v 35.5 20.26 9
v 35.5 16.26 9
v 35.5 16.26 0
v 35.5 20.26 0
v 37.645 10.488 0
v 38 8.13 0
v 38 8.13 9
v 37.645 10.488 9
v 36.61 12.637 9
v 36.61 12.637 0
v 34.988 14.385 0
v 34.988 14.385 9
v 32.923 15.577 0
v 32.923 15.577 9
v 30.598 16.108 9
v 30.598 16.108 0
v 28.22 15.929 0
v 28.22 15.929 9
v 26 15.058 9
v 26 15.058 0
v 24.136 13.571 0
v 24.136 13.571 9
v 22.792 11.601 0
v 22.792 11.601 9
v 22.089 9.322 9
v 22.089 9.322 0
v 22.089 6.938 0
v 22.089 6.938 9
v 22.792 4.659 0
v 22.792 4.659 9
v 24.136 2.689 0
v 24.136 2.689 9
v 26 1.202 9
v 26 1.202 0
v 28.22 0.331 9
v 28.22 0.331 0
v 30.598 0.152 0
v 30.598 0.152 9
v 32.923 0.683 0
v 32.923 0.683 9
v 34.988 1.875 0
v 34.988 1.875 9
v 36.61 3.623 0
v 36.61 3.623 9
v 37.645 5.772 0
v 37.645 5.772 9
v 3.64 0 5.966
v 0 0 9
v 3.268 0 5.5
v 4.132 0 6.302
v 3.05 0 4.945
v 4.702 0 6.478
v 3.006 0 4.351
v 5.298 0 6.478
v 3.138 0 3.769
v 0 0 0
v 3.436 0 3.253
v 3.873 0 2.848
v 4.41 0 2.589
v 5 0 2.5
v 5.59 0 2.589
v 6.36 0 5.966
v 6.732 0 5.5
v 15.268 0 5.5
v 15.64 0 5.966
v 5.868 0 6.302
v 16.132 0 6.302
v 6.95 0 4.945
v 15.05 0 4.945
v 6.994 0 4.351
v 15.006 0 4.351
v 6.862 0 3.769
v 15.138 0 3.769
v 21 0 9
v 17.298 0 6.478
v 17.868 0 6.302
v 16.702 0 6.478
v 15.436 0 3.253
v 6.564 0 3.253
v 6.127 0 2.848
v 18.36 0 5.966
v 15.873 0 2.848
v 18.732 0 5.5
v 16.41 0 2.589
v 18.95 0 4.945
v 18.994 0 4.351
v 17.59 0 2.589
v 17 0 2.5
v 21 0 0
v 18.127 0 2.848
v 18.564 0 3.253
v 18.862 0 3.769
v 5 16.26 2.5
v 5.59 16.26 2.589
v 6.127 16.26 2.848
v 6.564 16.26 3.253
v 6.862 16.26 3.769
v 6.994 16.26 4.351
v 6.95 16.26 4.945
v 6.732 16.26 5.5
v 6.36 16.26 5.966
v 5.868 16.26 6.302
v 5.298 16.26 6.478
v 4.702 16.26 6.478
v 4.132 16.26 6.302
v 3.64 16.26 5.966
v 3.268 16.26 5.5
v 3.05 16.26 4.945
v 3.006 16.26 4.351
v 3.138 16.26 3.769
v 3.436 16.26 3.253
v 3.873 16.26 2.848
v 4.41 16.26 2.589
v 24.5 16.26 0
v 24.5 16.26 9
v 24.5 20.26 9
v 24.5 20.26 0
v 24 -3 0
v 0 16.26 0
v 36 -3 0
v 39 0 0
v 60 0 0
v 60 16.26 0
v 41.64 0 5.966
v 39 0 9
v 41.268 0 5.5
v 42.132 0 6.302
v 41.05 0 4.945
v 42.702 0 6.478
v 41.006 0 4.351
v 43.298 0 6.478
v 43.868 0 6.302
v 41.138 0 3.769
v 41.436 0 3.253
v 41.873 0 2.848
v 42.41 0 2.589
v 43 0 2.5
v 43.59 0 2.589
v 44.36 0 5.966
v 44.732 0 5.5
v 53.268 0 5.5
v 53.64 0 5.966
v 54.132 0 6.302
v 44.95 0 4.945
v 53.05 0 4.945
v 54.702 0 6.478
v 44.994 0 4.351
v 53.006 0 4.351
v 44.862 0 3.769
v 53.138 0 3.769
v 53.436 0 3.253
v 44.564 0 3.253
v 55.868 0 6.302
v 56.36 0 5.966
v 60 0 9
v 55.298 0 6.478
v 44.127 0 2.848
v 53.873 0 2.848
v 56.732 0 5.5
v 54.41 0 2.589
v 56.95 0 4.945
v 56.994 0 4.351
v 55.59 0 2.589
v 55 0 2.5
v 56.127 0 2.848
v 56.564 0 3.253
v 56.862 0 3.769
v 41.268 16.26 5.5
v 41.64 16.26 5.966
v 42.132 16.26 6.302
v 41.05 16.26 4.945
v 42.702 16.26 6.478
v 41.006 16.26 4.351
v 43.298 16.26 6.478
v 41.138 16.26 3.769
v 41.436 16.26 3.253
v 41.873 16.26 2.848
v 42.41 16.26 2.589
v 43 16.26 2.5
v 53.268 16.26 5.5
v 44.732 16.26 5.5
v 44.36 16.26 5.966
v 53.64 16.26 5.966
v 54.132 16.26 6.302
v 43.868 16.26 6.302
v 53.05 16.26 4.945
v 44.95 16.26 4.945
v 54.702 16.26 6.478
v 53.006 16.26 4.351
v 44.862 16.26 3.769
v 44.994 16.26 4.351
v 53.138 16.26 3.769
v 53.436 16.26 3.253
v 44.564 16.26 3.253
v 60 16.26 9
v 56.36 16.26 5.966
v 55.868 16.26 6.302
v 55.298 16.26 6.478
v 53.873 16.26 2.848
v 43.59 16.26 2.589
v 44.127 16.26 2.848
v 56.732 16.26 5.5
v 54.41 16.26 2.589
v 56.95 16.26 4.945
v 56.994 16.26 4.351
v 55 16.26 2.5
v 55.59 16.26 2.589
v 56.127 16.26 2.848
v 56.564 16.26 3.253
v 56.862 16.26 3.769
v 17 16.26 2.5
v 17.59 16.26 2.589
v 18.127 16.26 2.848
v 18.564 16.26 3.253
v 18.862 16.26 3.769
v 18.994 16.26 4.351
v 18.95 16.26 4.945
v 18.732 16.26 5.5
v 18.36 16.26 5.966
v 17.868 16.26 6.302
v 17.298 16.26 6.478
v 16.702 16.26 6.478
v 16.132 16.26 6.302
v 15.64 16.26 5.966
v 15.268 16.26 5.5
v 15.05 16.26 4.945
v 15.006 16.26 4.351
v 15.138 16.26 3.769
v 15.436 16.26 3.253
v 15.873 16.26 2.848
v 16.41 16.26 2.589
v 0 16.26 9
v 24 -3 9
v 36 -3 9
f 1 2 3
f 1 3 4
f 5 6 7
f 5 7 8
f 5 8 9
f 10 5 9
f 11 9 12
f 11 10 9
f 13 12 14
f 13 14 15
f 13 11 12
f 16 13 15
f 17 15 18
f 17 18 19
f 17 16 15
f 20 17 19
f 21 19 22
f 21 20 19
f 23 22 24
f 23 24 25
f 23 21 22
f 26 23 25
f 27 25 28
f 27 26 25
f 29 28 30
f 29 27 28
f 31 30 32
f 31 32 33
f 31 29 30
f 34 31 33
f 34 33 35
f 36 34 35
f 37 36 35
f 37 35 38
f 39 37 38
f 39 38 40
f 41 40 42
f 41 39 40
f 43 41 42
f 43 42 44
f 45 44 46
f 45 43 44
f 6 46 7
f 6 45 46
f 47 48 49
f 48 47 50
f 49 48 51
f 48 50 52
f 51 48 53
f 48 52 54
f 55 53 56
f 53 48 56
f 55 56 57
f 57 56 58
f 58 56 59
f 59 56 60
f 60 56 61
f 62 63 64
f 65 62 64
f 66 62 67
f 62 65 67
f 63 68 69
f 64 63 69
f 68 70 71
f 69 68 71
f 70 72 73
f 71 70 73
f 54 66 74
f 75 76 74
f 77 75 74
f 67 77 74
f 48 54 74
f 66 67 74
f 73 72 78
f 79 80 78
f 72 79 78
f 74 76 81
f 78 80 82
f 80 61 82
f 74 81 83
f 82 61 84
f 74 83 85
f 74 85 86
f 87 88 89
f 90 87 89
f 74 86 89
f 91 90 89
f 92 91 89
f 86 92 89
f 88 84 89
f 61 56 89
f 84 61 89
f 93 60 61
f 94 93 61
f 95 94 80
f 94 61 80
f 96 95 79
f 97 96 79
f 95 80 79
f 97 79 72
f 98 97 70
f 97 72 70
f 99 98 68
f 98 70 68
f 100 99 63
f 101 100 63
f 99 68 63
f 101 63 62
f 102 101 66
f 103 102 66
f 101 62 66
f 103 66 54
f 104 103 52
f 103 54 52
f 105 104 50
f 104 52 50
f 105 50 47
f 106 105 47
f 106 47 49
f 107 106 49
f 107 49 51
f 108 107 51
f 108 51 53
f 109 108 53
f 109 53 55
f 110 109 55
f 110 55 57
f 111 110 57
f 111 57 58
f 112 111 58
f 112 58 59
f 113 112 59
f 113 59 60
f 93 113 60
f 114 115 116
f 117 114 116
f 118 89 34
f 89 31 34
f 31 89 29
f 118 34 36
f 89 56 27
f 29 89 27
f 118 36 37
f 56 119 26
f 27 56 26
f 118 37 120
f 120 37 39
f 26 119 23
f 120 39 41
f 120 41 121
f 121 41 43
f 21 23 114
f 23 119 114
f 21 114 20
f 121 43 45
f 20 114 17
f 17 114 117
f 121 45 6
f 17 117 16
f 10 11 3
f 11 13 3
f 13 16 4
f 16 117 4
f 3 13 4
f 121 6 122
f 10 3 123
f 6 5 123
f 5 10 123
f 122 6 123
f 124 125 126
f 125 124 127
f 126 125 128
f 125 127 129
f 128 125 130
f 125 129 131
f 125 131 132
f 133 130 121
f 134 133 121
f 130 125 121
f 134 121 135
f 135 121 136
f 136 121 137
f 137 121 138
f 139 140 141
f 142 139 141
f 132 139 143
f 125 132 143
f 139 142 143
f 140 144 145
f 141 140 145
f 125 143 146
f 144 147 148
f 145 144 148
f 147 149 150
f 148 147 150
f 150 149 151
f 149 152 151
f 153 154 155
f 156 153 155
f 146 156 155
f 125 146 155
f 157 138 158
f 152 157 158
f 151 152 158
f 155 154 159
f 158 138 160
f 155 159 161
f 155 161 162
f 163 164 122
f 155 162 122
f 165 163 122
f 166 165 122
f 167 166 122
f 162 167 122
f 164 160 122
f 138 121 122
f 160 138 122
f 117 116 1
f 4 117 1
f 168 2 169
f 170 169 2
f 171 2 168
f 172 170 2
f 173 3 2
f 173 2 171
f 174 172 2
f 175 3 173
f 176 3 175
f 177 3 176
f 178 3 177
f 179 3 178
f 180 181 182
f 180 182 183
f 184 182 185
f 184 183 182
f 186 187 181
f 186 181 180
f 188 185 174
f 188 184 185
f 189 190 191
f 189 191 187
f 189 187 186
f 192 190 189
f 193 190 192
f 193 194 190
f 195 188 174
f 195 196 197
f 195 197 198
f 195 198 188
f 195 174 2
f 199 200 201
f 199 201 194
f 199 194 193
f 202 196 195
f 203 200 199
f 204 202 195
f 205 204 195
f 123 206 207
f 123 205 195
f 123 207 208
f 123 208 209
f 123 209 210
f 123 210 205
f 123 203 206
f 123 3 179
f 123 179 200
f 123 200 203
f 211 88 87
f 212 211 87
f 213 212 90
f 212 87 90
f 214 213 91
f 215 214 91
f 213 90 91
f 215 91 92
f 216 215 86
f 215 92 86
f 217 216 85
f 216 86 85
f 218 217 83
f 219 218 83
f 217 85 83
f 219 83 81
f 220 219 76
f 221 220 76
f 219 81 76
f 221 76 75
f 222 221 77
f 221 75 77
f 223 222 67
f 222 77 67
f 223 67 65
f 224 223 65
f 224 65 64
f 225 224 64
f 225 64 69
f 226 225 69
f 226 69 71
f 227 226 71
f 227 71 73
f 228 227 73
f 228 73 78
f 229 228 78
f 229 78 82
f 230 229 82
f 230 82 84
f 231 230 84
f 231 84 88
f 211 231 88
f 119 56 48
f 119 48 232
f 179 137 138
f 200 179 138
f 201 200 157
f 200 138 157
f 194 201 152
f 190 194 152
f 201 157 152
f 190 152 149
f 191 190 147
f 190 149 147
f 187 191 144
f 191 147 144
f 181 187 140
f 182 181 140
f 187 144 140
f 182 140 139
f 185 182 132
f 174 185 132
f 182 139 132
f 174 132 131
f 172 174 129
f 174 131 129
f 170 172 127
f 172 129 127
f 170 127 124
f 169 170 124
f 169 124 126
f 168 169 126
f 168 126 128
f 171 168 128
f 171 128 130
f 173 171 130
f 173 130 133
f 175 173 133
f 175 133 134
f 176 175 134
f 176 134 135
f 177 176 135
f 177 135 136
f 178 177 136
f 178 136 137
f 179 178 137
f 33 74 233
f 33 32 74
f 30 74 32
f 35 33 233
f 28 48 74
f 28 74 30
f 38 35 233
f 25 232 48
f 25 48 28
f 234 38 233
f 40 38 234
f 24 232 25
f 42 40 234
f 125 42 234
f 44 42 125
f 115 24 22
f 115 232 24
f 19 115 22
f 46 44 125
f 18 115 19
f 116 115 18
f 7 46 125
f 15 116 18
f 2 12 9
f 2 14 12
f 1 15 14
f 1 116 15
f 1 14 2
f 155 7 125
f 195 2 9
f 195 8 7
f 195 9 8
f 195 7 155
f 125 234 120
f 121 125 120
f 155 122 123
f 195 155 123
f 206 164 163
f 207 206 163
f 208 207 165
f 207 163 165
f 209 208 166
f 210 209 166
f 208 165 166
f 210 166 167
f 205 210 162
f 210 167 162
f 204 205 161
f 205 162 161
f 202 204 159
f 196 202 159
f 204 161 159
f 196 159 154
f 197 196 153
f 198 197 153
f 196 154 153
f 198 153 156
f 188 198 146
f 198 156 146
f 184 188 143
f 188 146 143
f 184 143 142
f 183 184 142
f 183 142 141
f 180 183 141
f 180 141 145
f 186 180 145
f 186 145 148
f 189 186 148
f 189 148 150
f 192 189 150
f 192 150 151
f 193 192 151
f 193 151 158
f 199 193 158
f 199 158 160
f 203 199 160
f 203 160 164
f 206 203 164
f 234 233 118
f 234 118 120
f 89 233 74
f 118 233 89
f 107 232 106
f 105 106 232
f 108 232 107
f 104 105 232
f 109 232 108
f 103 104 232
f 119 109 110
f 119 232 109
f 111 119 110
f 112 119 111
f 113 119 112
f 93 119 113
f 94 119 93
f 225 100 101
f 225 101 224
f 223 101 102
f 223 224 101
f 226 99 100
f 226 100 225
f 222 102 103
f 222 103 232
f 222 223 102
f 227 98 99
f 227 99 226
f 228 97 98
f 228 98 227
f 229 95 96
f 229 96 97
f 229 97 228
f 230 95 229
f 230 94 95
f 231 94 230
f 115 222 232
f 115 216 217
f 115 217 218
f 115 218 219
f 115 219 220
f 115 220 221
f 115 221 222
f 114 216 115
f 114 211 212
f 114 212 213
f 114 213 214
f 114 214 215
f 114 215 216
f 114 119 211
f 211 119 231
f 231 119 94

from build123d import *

# Parameters (mm, degrees)
ESQUISSE1_W             = 60
ESQUISSE1_H             = 16.26
ESQUISSE1_R             = 8
BOSS_EXTRU_1_DEPTH      = 9
ESQUISSE2_W             = 11
ESQUISSE2_H             = 4
BOSS_EXTRU_2_DEPTH      = 9
ESQUISSE3_W             = 12
ESQUISSE3_H             = 3
BOSS_EXTRU_3_DEPTH      = 9
CHANFREIN2_SIZE         = 3
ESQUISSE4_R             = 2
ENL_V_MAT_EXTRU_1_DEPTH = 64.964580824


with BuildPart() as part:
    # Esquisse1 → Boss.-Extru.1 (new body)
    with BuildSketch(Plane.XY):
        with Locations((30, 8.13)):
            Rectangle(ESQUISSE1_W, ESQUISSE1_H)
        with Locations((30, 8.13)):
            Circle(ESQUISSE1_R, mode=Mode.SUBTRACT)
    extrude(amount=BOSS_EXTRU_1_DEPTH)

    # Esquisse2 → Boss.-Extru.2 (add)
    with BuildSketch(Plane.XY.offset(9)):
        with Locations((30, 18.26)):
            Rectangle(ESQUISSE2_W, ESQUISSE2_H)
    extrude(amount=-BOSS_EXTRU_2_DEPTH)

    # Esquisse3 → Boss.-Extru.3 (add)
    with BuildSketch(Plane.XY.offset(9)):
        with Locations((30, -1.5)):
            Rectangle(ESQUISSE3_W, ESQUISSE3_H)
    extrude(amount=-BOSS_EXTRU_3_DEPTH)

    # Chanfrein2
    chanfrein2_edges = [part.edges().sort_by_distance(p)[0] for p in [
        (36, 0, 4.5),
        (24, 0, 4.5),
    ]]
    chamfer(chanfrein2_edges, length=CHANFREIN2_SIZE - 0.0001)  # a hair under: the kernel refuses the full size

    # Esquisse4 → Enlèv. mat.-Extru.1 (cut, through all)
    with BuildSketch(Plane.XZ):
        with Locations(Location((17, 4.5, 0), (0, 0, 270))):
            Circle(ESQUISSE4_R)
        with Locations(Location((5, 4.5, 0), (0, 0, 270))):
            Circle(ESQUISSE4_R)
        with Locations(Location((55, 4.5, 0), (0, 0, 270))):
            Circle(ESQUISSE4_R)
        with Locations(Location((43, 4.5, 0), (0, 0, 270))):
            Circle(ESQUISSE4_R)
    extrude(amount=-ENL_V_MAT_EXTRU_1_DEPTH, mode=Mode.SUBTRACT)


solid = part.part
